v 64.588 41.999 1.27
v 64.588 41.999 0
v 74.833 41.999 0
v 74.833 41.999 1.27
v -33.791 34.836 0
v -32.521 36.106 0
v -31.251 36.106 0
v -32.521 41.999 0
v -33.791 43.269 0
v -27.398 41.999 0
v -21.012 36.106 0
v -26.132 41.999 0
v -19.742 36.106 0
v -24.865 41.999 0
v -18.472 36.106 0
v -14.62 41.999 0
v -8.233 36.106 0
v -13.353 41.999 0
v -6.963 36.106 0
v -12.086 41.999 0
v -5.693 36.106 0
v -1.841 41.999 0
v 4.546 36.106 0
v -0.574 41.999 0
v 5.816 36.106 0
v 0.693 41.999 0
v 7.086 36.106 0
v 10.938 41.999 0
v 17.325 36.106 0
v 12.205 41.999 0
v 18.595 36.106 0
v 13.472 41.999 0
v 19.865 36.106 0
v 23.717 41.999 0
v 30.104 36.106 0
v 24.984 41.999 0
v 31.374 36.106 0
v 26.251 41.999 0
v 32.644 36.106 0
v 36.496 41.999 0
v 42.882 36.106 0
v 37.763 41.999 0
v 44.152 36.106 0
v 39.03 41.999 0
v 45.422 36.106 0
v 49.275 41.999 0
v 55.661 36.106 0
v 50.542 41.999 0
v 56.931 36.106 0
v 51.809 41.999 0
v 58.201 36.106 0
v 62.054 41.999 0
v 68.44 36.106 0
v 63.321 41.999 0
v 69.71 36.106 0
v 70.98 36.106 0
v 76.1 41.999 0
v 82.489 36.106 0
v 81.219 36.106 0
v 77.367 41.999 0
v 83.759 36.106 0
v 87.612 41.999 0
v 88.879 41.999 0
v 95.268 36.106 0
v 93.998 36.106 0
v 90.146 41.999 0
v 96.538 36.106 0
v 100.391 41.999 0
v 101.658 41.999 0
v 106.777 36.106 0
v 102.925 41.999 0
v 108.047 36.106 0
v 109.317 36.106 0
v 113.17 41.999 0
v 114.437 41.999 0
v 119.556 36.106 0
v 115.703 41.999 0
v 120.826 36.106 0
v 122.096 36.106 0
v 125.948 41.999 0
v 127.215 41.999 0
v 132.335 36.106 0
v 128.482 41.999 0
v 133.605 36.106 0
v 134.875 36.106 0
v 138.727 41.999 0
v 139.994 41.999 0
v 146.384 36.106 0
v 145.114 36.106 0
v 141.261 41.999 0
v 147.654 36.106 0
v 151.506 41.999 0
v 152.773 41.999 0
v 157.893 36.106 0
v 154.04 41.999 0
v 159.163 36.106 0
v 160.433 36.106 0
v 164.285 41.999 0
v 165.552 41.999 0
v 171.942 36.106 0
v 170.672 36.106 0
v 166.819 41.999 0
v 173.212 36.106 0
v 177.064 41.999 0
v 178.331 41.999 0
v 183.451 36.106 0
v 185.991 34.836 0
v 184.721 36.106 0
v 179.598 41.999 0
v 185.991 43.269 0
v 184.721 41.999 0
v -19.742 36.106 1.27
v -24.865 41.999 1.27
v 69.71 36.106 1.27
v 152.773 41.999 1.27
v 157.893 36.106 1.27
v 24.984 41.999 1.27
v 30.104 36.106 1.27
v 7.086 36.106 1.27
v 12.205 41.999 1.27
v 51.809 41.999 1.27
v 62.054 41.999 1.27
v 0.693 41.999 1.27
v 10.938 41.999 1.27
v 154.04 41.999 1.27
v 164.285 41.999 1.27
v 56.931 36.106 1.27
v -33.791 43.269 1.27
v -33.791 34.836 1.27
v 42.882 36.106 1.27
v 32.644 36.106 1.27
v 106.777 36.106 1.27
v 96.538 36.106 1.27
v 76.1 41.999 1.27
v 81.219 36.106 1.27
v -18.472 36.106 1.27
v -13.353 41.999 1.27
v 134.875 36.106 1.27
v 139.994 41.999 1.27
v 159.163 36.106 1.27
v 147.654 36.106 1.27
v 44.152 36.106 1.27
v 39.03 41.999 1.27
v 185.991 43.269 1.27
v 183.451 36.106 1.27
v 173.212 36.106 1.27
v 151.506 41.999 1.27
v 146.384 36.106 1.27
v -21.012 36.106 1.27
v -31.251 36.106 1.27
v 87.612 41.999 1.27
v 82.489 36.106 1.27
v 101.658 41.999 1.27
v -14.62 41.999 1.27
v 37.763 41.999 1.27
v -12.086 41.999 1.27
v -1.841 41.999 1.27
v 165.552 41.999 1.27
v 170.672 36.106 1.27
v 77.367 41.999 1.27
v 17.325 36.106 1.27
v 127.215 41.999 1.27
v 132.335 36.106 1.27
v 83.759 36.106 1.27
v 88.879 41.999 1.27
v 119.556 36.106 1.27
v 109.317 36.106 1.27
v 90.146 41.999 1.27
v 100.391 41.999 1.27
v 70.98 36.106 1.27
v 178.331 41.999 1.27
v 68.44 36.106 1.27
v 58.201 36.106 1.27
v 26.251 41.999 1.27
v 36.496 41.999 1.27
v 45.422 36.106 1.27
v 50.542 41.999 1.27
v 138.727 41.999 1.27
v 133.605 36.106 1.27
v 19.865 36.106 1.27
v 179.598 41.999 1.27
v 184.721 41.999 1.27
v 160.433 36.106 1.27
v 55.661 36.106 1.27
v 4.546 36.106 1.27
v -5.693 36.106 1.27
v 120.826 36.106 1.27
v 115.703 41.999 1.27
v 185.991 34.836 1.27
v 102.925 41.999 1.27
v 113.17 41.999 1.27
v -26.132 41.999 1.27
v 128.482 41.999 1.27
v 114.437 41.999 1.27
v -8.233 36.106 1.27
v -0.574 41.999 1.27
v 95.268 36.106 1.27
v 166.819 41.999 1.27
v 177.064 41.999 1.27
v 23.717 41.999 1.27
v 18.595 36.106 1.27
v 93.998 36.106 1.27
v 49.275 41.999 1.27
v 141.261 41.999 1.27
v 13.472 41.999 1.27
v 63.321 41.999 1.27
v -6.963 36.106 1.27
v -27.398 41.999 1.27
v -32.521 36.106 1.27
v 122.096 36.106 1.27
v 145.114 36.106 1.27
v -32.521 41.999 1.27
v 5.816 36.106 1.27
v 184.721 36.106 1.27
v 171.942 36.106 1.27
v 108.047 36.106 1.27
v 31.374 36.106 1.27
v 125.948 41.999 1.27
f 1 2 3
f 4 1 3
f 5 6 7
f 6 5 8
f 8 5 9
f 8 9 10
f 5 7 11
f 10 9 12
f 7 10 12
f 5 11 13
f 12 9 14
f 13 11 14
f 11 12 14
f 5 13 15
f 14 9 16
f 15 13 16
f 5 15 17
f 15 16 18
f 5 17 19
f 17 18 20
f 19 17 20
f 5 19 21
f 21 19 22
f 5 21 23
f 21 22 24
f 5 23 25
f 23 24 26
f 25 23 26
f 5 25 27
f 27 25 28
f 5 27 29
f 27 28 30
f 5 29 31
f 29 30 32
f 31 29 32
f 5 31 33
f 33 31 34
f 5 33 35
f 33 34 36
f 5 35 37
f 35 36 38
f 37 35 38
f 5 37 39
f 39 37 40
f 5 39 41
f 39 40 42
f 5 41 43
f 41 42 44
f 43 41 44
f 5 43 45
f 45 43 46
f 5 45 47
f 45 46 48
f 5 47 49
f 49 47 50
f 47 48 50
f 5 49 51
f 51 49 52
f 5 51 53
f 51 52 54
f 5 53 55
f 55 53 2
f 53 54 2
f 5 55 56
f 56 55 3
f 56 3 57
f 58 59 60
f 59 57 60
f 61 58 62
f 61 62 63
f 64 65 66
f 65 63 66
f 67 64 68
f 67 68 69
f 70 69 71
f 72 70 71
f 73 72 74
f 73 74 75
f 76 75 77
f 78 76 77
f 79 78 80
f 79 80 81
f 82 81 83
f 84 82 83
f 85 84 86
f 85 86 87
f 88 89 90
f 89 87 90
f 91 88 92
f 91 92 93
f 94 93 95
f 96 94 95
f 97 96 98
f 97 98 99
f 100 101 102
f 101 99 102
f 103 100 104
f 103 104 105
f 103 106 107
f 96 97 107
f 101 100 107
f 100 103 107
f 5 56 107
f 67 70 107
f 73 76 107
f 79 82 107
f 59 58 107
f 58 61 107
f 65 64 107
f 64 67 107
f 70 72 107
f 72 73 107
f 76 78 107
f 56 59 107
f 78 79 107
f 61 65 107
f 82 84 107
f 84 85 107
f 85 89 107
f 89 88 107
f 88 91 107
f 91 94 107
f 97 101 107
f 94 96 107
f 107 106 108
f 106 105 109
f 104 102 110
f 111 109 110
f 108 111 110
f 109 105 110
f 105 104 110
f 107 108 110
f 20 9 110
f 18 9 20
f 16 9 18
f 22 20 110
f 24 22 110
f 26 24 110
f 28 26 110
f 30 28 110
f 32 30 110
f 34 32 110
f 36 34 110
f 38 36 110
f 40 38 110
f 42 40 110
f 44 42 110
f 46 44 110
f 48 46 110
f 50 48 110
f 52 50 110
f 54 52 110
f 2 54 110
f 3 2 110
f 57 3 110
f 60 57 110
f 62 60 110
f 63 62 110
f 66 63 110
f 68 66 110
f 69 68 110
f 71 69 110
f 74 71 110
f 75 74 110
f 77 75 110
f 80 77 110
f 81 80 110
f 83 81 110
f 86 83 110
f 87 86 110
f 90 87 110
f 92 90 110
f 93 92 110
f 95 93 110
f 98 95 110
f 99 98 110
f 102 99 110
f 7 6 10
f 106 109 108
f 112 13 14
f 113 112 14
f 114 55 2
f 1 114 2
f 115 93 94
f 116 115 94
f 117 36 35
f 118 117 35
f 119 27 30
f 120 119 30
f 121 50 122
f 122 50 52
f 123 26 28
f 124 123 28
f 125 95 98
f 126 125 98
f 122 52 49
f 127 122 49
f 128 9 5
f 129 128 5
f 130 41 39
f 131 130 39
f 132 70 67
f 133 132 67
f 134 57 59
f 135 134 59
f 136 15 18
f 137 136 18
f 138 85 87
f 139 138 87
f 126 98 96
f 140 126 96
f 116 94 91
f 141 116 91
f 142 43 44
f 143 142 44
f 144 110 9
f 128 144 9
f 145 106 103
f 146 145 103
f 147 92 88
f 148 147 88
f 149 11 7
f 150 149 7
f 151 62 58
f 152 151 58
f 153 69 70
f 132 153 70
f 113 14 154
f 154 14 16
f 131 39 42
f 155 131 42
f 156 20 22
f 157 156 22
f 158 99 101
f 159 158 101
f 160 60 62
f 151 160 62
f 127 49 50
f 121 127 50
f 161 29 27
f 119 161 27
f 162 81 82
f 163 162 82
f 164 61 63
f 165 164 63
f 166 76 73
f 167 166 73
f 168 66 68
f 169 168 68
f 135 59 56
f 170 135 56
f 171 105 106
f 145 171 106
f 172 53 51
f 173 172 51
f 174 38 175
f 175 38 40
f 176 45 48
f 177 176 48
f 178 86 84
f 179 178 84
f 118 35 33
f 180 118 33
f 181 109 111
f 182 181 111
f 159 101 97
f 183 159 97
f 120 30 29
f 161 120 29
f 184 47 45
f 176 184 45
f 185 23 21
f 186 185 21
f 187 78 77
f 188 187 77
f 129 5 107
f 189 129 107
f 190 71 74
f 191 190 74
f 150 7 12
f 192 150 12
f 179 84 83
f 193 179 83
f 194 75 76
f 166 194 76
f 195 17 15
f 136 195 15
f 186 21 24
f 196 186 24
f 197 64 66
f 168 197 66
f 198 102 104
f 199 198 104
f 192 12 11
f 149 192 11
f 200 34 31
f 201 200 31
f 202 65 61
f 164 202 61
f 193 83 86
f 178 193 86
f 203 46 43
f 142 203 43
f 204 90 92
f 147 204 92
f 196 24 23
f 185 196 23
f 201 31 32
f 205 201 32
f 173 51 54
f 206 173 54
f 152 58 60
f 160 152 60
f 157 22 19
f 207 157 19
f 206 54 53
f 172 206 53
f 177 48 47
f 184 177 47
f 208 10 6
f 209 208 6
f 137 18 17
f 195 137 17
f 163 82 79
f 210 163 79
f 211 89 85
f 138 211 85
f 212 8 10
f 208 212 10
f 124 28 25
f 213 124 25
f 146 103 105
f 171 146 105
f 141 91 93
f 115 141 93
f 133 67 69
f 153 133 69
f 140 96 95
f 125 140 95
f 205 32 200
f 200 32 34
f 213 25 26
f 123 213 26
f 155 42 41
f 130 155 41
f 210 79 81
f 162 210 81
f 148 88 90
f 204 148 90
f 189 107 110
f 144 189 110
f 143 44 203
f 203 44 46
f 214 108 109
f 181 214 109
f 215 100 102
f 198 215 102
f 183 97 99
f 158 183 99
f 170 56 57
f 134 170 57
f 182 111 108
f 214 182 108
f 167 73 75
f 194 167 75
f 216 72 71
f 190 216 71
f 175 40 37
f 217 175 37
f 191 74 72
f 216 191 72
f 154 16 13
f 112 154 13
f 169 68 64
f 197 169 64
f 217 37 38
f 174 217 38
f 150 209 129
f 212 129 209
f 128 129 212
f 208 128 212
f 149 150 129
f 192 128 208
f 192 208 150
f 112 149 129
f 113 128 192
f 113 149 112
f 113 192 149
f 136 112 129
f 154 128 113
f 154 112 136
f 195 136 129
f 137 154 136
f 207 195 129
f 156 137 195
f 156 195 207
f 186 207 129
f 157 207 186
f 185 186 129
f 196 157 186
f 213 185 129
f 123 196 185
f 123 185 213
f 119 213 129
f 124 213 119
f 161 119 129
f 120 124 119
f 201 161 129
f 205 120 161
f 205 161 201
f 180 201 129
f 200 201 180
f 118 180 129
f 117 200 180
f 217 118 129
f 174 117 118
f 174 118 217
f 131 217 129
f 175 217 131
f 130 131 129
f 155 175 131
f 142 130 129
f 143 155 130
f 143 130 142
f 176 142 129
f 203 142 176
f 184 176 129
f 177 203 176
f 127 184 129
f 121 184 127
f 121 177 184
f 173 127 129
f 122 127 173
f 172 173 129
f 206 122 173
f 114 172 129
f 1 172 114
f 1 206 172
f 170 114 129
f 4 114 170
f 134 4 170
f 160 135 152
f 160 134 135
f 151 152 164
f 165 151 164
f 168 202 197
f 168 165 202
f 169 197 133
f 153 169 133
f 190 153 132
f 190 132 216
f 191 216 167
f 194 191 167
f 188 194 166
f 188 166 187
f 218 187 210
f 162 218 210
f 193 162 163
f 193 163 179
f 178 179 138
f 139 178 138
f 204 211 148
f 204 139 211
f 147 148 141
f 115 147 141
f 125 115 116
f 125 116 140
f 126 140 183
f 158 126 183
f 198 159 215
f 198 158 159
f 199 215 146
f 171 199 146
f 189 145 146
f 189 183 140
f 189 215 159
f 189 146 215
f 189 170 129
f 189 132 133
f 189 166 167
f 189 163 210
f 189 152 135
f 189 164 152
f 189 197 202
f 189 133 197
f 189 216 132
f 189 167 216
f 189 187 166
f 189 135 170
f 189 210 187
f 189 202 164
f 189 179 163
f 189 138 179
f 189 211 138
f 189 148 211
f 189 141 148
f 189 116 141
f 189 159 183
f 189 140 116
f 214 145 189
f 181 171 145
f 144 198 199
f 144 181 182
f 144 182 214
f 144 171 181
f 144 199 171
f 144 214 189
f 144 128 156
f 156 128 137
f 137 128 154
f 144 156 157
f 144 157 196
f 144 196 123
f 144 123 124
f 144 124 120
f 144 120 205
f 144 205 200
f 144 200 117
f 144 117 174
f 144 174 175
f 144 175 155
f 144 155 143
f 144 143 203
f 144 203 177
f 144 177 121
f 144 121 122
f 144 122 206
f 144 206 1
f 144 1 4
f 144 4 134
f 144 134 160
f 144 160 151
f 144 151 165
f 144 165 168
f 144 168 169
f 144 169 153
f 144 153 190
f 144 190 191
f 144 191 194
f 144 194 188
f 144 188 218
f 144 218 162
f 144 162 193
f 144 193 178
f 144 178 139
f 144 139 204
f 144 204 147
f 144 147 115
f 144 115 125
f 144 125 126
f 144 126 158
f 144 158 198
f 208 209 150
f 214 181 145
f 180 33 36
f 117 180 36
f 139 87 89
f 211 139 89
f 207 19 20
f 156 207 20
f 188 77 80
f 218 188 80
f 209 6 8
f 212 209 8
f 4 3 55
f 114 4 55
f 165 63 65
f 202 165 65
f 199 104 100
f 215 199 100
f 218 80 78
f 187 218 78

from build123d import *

# Parameters (mm, degrees)
F1_DEPTH = 1.27


with BuildPart() as f1:
    # F0 (on Top) → F1 (new body)
    with BuildSketch(Plane.XY):
        Polygon((185.990537, 43.269212), (-33.791009, 43.269212), (-33.791009, 34.836412), (185.990537, 34.836412), (185.990537, 36.106412), align=None)
        Polygon((-32.521009, 36.106412), (-32.521009, 41.999212), (-27.398476, 41.999212), align=None, mode=Mode.SUBTRACT)
        Polygon((-21.012094, 36.106412), (-31.251009, 36.106412), (-26.131552, 41.999212), align=None, mode=Mode.SUBTRACT)
        Polygon((-14.619562, 41.999212), (-19.742094, 36.106412), (-24.864627, 41.999212), align=None, mode=Mode.SUBTRACT)
        Polygon((-8.23318, 36.106412), (-18.472094, 36.106412), (-13.352637, 41.999212), align=None, mode=Mode.SUBTRACT)
        Polygon((-1.840647, 41.999212), (-6.96318, 36.106412), (-12.085713, 41.999212), align=None, mode=Mode.SUBTRACT)
        Polygon((4.545734, 36.106412), (-5.69318, 36.106412), (-0.573723, 41.999212), align=None, mode=Mode.SUBTRACT)
        Polygon((10.938267, 41.999212), (5.815734, 36.106412), (0.693202, 41.999212), align=None, mode=Mode.SUBTRACT)
        Polygon((7.085734, 36.106412), (12.205192, 41.999212), (17.324649, 36.106412), align=None, mode=Mode.SUBTRACT)
        Polygon((23.717182, 41.999212), (18.594649, 36.106412), (13.472116, 41.999212), align=None, mode=Mode.SUBTRACT)
        Polygon((30.103563, 36.106412), (19.864649, 36.106412), (24.984106, 41.999212), align=None, mode=Mode.SUBTRACT)
        Polygon((36.496096, 41.999212), (31.373563, 36.106412), (26.25103, 41.999212), align=None, mode=Mode.SUBTRACT)
        Polygon((32.643563, 36.106412), (37.763021, 41.999212), (42.882478, 36.106412), align=None, mode=Mode.SUBTRACT)
        Polygon((49.275011, 41.999212), (44.152478, 36.106412), (39.029945, 41.999212), align=None, mode=Mode.SUBTRACT)
        Polygon((45.422478, 36.106412), (50.541935, 41.999212), (55.661392, 36.106412), align=None, mode=Mode.SUBTRACT)
        Polygon((62.053925, 41.999212), (56.931392, 36.106412), (51.808859, 41.999212), align=None, mode=Mode.SUBTRACT)
        Polygon((58.201392, 36.106412), (63.320849, 41.999212), (68.440307, 36.106412), align=None, mode=Mode.SUBTRACT)
        Polygon((74.83284, 41.999212), (69.710307, 36.106412), (64.587774, 41.999212), align=None, mode=Mode.SUBTRACT)
        Polygon((81.219221, 36.106412), (70.980307, 36.106412), (76.099764, 41.999212), align=None, mode=Mode.SUBTRACT)
        Polygon((87.611754, 41.999212), (82.489221, 36.106412), (77.366688, 41.999212), align=None, mode=Mode.SUBTRACT)
        Polygon((83.759221, 36.106412), (88.878678, 41.999212), (93.998136, 36.106412), align=None, mode=Mode.SUBTRACT)
        Polygon((100.390668, 41.999212), (95.268136, 36.106412), (90.145603, 41.999212), align=None, mode=Mode.SUBTRACT)
        Polygon((96.538136, 36.106412), (101.657593, 41.999212), (106.77705, 36.106412), align=None, mode=Mode.SUBTRACT)
        Polygon((113.169583, 41.999212), (108.04705, 36.106412), (102.924517, 41.999212), align=None, mode=Mode.SUBTRACT)
        Polygon((109.31705, 36.106412), (114.436507, 41.999212), (119.555964, 36.106412), align=None, mode=Mode.SUBTRACT)
        Polygon((125.948497, 41.999212), (120.825964, 36.106412), (115.703432, 41.999212), align=None, mode=Mode.SUBTRACT)
        Polygon((122.095964, 36.106412), (127.215422, 41.999212), (132.334879, 36.106412), align=None, mode=Mode.SUBTRACT)
        Polygon((138.727412, 41.999212), (133.604879, 36.106412), (128.482346, 41.999212), align=None, mode=Mode.SUBTRACT)
        Polygon((134.874879, 36.106412), (139.994336, 41.999212), (145.113793, 36.106412), align=None, mode=Mode.SUBTRACT)
        Polygon((151.506326, 41.999212), (146.383793, 36.106412), (141.26126, 41.999212), align=None, mode=Mode.SUBTRACT)
        Polygon((147.653793, 36.106412), (152.773251, 41.999212), (157.892708, 36.106412), align=None, mode=Mode.SUBTRACT)
        Polygon((164.285241, 41.999212), (159.162708, 36.106412), (154.040175, 41.999212), align=None, mode=Mode.SUBTRACT)
        Polygon((160.432708, 36.106412), (165.552165, 41.999212), (170.671622, 36.106412), align=None, mode=Mode.SUBTRACT)
        Polygon((177.064155, 41.999212), (171.941622, 36.106412), (166.819089, 41.999212), align=None, mode=Mode.SUBTRACT)
        Polygon((173.211622, 36.106412), (178.331079, 41.999212), (183.450537, 36.106412), align=None, mode=Mode.SUBTRACT)
        Polygon((184.720537, 41.999212), (184.720537, 36.106412), (179.598004, 41.999212), align=None, mode=Mode.SUBTRACT)
    extrude(amount=F1_DEPTH)


solid = f1.part
